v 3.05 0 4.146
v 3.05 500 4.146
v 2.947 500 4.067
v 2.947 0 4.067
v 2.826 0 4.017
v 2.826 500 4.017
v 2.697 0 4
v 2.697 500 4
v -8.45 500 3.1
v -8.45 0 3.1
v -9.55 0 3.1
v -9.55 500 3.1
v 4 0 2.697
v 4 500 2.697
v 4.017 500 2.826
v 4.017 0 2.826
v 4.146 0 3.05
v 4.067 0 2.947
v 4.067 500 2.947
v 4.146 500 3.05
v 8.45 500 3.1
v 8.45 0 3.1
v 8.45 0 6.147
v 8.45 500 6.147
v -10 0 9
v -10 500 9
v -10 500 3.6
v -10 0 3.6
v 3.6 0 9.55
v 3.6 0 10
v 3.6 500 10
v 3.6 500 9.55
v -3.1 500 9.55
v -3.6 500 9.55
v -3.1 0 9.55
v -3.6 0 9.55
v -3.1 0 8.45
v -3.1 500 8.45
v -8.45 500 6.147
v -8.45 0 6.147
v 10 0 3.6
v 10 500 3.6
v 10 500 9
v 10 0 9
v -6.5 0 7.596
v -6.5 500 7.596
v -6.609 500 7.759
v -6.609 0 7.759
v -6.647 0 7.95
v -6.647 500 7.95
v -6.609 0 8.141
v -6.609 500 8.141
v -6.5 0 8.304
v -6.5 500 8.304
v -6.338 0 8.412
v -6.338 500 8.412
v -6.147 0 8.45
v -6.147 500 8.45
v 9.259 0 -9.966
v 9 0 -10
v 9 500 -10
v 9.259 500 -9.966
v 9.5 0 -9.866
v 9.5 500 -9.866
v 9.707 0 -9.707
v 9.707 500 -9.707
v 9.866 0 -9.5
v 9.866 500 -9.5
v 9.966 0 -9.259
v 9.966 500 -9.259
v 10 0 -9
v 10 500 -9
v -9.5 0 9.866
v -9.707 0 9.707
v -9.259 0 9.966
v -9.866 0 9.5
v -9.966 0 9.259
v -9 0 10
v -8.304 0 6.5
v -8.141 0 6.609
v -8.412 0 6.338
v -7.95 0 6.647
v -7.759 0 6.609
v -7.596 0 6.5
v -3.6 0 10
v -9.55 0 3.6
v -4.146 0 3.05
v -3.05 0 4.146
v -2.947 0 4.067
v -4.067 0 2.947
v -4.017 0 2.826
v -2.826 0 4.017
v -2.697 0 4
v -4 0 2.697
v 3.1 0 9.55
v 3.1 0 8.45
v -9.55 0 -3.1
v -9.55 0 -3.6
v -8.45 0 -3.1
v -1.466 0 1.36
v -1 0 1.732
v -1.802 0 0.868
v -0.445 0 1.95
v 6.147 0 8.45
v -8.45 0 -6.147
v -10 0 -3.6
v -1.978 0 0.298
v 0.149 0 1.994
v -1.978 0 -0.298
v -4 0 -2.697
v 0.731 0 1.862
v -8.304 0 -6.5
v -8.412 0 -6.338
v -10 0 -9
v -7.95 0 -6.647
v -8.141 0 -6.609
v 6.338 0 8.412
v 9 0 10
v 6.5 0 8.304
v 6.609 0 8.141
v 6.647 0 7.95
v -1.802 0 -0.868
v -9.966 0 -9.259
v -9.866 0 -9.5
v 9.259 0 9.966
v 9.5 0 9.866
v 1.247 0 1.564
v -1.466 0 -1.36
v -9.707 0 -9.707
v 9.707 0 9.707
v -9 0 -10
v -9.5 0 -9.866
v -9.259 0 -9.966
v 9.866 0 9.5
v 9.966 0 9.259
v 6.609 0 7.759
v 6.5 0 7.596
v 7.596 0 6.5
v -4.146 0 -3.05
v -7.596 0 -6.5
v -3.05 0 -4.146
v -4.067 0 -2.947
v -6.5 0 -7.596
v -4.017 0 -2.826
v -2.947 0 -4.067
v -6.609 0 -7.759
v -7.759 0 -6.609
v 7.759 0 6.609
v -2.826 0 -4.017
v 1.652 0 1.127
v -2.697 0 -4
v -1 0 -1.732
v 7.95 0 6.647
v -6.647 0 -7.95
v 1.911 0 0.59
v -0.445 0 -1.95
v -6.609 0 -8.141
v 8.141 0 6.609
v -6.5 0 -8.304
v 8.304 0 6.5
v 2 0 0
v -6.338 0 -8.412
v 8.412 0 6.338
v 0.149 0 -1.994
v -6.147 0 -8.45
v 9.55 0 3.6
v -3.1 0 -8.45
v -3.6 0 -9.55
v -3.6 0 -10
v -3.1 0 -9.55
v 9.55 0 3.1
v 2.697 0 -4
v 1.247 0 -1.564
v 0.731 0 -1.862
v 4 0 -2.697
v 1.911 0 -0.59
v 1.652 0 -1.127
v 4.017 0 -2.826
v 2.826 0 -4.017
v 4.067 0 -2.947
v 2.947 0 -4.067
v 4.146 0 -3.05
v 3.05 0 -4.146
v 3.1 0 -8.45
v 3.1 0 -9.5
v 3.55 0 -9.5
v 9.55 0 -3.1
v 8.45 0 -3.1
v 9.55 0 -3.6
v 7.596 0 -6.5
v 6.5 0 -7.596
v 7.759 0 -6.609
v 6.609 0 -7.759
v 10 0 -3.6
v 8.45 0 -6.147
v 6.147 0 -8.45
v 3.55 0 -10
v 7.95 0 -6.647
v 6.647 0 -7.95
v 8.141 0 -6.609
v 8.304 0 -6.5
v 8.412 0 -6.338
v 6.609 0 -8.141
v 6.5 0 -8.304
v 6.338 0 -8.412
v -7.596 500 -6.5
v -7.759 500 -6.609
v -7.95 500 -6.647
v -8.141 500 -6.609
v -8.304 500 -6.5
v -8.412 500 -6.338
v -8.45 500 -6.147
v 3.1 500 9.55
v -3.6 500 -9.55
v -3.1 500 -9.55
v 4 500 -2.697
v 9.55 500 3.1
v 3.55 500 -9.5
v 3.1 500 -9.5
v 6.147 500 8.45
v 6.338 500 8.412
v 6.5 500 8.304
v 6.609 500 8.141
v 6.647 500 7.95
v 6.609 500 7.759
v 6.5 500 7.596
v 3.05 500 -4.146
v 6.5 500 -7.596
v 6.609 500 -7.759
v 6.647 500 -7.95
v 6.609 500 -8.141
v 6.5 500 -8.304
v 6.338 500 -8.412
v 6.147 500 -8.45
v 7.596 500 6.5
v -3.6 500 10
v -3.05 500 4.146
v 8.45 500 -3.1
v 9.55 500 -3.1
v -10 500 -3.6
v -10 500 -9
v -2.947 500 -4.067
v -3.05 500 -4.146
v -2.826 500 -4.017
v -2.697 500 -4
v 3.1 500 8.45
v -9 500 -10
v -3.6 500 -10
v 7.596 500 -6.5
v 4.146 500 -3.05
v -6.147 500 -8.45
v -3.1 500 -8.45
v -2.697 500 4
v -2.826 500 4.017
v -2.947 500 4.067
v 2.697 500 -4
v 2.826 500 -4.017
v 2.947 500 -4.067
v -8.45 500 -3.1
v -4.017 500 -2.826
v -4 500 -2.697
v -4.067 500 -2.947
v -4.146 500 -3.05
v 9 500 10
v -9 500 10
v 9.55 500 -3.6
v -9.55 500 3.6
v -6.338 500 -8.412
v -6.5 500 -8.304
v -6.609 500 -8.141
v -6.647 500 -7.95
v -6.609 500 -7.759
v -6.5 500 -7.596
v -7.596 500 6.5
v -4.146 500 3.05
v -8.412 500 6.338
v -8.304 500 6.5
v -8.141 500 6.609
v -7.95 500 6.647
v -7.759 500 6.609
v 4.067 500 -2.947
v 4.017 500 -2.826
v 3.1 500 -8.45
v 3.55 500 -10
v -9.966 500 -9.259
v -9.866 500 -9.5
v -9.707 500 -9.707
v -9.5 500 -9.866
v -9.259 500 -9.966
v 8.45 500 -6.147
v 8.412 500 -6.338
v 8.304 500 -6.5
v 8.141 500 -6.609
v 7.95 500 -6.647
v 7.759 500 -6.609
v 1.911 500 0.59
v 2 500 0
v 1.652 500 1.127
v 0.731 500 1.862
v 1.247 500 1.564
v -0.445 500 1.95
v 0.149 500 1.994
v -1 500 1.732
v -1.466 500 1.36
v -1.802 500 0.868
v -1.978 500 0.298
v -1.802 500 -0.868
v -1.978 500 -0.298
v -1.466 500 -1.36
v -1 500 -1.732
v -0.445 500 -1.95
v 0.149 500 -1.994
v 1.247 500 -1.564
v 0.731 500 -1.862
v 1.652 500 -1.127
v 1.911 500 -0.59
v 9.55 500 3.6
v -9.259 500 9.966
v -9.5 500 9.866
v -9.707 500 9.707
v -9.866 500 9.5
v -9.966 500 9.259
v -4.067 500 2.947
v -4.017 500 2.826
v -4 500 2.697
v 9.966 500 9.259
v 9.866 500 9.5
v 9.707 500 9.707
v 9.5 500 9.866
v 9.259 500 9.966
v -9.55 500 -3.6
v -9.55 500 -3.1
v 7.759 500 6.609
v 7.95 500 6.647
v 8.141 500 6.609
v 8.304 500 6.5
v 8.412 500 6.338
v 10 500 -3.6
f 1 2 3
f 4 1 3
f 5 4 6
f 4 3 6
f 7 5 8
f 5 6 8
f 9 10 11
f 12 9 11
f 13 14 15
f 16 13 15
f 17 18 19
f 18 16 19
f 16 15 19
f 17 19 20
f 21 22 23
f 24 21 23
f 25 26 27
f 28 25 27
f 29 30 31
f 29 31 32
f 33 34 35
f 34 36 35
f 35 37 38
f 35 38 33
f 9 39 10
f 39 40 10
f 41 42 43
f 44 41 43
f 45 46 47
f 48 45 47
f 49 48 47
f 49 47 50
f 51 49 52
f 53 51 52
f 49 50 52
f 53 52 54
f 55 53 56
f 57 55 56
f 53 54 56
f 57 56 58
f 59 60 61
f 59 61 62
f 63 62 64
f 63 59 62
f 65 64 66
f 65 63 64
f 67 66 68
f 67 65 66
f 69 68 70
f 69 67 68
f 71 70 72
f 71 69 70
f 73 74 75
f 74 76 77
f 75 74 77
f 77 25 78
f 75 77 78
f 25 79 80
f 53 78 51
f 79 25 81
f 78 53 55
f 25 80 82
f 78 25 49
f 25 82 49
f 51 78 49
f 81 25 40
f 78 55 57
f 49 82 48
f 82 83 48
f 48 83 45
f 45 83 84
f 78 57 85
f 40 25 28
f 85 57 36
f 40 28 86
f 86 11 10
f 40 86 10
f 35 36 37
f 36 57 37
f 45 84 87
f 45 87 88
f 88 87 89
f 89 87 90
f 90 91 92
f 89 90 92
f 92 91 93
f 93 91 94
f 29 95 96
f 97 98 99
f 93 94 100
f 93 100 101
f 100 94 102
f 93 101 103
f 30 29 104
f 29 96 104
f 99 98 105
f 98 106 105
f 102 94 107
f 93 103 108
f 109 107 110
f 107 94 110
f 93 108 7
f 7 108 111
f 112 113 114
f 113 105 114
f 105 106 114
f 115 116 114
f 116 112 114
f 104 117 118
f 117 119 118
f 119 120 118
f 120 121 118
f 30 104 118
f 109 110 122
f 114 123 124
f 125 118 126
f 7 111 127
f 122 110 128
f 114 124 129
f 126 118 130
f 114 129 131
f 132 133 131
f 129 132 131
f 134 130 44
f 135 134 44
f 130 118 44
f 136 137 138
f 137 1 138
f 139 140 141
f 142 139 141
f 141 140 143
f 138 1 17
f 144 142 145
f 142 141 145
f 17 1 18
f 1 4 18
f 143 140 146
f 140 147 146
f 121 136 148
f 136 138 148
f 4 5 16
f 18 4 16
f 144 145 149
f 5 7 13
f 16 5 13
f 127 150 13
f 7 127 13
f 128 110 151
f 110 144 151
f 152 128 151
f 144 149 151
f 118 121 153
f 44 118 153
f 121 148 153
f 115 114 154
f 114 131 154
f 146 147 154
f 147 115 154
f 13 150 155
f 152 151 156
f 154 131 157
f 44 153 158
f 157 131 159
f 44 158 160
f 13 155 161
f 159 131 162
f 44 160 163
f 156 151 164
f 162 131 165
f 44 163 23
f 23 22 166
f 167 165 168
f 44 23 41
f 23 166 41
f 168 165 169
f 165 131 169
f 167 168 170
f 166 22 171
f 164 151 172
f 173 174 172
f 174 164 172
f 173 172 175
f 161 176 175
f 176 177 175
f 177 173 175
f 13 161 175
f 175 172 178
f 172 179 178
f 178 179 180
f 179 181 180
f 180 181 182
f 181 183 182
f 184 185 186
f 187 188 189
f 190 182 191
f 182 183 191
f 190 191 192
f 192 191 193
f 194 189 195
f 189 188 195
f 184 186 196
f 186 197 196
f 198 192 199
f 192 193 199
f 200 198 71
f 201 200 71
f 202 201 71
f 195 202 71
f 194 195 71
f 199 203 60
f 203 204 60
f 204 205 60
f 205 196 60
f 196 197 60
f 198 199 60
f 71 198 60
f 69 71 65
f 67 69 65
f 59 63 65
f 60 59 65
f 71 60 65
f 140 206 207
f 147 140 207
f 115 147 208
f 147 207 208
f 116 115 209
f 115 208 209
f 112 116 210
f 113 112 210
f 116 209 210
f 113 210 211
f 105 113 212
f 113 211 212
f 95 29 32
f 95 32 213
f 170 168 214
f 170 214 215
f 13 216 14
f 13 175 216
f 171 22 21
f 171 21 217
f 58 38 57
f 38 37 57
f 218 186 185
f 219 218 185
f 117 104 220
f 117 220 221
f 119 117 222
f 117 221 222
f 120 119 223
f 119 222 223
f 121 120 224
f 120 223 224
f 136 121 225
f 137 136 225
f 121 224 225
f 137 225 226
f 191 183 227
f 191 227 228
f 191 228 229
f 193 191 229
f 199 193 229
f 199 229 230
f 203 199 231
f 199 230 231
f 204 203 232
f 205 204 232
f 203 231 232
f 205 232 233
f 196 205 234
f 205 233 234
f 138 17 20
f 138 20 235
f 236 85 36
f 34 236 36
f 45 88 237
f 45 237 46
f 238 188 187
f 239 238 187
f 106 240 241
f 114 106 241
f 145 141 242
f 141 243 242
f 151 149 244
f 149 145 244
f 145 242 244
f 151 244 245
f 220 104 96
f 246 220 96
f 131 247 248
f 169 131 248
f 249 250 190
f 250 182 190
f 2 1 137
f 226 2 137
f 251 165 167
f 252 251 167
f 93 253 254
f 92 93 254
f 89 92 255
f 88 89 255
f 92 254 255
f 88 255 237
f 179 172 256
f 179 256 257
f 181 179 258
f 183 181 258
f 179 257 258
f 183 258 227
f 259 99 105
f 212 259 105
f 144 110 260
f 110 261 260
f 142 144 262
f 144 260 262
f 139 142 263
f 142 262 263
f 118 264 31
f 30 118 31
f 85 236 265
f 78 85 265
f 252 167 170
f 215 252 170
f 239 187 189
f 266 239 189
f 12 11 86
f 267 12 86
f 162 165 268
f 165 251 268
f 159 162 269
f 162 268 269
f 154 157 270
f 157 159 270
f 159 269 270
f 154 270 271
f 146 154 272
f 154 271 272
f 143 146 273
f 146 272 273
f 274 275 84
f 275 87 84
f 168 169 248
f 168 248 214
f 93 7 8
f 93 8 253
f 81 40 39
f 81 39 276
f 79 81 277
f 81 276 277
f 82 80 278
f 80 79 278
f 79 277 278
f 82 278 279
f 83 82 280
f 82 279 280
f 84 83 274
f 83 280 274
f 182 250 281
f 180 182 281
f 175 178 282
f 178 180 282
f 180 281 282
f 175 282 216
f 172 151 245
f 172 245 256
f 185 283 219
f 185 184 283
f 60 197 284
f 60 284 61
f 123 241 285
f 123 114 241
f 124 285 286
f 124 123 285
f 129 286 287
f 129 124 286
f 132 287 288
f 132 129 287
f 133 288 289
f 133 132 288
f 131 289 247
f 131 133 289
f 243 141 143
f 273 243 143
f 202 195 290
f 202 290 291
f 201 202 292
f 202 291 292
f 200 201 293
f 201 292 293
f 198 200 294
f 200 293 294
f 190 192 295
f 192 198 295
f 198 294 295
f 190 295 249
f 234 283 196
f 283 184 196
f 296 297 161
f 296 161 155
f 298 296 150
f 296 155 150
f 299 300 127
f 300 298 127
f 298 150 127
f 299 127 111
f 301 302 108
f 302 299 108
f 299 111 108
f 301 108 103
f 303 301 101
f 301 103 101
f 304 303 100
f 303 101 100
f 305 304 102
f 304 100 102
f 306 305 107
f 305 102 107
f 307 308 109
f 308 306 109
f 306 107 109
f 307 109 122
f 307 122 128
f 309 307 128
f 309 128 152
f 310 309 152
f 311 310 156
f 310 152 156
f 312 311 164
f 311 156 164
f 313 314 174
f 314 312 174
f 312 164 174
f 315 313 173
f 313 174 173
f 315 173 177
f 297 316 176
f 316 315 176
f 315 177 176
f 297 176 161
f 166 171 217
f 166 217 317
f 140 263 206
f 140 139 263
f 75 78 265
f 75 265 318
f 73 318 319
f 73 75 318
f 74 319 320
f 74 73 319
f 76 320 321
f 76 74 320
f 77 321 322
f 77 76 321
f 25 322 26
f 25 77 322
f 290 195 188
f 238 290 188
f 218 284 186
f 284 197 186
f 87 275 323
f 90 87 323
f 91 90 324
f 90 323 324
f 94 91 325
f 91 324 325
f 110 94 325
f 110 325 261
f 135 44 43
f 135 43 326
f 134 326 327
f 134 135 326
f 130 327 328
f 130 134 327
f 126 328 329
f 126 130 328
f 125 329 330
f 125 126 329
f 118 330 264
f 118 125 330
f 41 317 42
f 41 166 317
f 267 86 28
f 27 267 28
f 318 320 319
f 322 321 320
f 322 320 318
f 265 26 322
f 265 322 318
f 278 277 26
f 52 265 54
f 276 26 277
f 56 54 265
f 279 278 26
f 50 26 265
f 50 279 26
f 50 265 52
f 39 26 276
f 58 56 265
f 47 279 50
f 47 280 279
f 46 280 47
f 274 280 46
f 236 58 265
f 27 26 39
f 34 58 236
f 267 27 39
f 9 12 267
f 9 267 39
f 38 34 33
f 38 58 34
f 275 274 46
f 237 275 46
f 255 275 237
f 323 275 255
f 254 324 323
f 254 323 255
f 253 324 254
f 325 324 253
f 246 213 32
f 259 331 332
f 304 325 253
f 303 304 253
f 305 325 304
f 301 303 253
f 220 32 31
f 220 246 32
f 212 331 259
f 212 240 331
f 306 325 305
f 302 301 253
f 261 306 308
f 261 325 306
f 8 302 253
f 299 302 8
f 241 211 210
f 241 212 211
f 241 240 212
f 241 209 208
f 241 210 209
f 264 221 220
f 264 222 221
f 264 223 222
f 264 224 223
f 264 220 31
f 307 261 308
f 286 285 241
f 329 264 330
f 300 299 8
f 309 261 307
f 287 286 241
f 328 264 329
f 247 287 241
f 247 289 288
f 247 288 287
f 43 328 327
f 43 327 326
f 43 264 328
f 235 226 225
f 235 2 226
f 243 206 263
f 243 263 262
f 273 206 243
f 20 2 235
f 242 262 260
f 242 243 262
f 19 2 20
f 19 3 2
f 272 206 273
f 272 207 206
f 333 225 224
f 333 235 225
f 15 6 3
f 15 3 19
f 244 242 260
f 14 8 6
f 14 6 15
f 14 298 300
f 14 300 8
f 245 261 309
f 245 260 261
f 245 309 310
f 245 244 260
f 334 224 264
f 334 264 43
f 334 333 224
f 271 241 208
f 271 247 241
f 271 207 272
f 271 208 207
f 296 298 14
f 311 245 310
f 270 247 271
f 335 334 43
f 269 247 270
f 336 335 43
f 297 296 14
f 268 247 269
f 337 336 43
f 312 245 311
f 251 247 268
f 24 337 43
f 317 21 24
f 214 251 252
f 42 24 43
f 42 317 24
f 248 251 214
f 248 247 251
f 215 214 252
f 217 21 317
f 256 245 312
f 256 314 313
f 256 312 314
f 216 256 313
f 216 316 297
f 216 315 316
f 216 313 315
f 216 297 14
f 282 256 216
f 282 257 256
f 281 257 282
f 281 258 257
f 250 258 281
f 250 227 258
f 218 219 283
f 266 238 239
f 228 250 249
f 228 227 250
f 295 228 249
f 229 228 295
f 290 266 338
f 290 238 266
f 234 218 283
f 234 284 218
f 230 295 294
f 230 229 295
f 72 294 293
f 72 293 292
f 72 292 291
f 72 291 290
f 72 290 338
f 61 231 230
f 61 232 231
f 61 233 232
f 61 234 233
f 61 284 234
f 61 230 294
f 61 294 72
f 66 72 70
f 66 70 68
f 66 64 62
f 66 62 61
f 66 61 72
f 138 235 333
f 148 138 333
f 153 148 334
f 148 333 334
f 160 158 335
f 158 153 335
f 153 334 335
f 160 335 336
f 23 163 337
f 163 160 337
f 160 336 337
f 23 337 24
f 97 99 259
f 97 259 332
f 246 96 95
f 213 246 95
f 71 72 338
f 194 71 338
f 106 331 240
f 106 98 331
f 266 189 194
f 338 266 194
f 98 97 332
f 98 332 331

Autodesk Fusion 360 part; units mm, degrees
sketch "Sketch1" plane through (0, 0, 0) normal (0, 1, 0) x (1, 0, 0)
  line L0 (9, -10) -> (-9, -10)
  line L1 (-10, -9) -> (-10, 9)
  line L2 (-9, 10) -> (9, 10)
  line L3 (10, 9) -> (10, -9)
  line L4 (10, -10) -> (-10, 10) construction
  line L5 (-10, -10) -> (10, 10) construction
  line L6 (4, -4) -> (-4, -4)
  line L7 (-4, -4) -> (-4, 4)
  line L8 (-4, 4) -> (4, 4)
  line L9 (4, 4) -> (4, -4)
  line L10 (4, -4) -> (-4, 4) construction
  line L11 (-4, -4) -> (4, 4) construction
  circle A0 centre (0, 0) radius 2
  line L12 (8.45, -8.45) -> (-8.45, -8.45)
  line L13 (-8.45, -8.45) -> (-8.45, 8.45)
  line L14 (-8.45, 8.45) -> (8.45, 8.45)
  line L15 (8.45, 8.45) -> (8.45, -8.45)
  line L16 (8.45, -8.45) -> (-8.45, 8.45) construction
  line L17 (-8.45, -8.45) -> (8.45, 8.45) construction
  line L18 (-9.452, -10.548) -> (10.548, 9.452) construction
  line L19 (-10.548, -9.452) -> (9.452, 10.548) construction
  line L20 (10.548, -9.452) -> (-9.452, 10.548) construction
  line L21 (9.452, -10.548) -> (-10.548, 9.452) construction
  line L22 (3.1, -10) -> (-3.1, -10) construction
  line L23 (-3.1, -10) -> (-3.1, 10) construction
  line L24 (-3.1, 10) -> (3.1, 10) construction
  line L25 (3.1, 10) -> (3.1, -10) construction
  line L26 (10, -3.1) -> (-10, -3.1) construction
  line L27 (-10, -3.1) -> (-10, 3.1) construction
  line L28 (-10, 3.1) -> (10, 3.1) construction
  line L29 (10, 3.1) -> (10, -3.1) construction
  line L30 (-3.1, -8.45) -> (-3.1, -10)
  line L31 (3.1, -8.45) -> (3.1, -10)
  line L32 (-8.45, -3.1) -> (-10, -3.1)
  line L33 (-8.45, 3.1) -> (-10, 3.1)
  line L34 (8.45, -3.1) -> (10, -3.1)
  line L35 (8.45, 3.1) -> (10, 3.1)
  line L36 (-3.1, 8.45) -> (-3.1, 10)
  line L37 (3.1, 8.45) -> (3.1, 10)
  line L38 (-4, 2.904) -> (-8.45, 7.354)
  line L39 (-2.904, 4) -> (-7.354, 8.45)
  line L40 (2.904, 4) -> (7.354, 8.45)
  line L41 (4, 2.904) -> (8.45, 7.354)
  line L42 (-4, -2.904) -> (-8.45, -7.354)
  line L43 (-2.904, -4) -> (-7.354, -8.45)
  line L44 (2.904, -4) -> (7.354, -8.45)
  line L45 (4, -2.904) -> (8.45, -7.354)
  line L46 (-10, -3.1) -> (-9.55, -3.1)
  line L47 (-9.55, -3.1) -> (-9.55, -3.6)
  line L48 (-9.55, -3.6) -> (-10, -3.6)
  line L49 (-10, -3.6) -> (-10, -3.1)
  line L50 (-10, 3.1) -> (-9.55, 3.1)
  line L51 (-9.55, 3.1) -> (-9.55, 3.6)
  line L52 (-9.55, 3.6) -> (-10, 3.6)
  line L53 (-10, 3.6) -> (-10, 3.1)
  line L54 (-3.1, -10) -> (-3.6, -10)
  line L55 (-3.6, -10) -> (-3.6, -9.55)
  line L56 (-3.6, -9.55) -> (-3.1, -9.55)
  line L57 (-3.1, -9.55) -> (-3.1, -10)
  line L58 (3.1, -10) -> (3.6, -10)
  line L59 (3.6, -10) -> (3.6, -9.55)
  line L60 (3.6, -9.55) -> (3.1, -9.55)
  line L61 (3.1, -9.55) -> (3.1, -10)
  line L62 (10, -3.1) -> (9.55, -3.1)
  line L63 (9.55, -3.1) -> (9.55, -3.6)
  line L64 (9.55, -3.6) -> (10, -3.6)
  line L65 (10, -3.6) -> (10, -3.1)
  line L66 (10, 3.1) -> (9.55, 3.1)
  line L67 (9.55, 3.1) -> (9.55, 3.6)
  line L68 (9.55, 3.6) -> (10, 3.6)
  line L69 (10, 3.6) -> (10, 3.1)
  line L70 (-3.1, 10) -> (-3.6, 10)
  line L71 (-3.6, 10) -> (-3.6, 9.55)
  line L72 (-3.6, 9.55) -> (-3.1, 9.55)
  line L73 (-3.1, 9.55) -> (-3.1, 10)
  line L74 (3.1, 10) -> (3.55, 10)
  line L75 (3.55, 10) -> (3.55, 9.5)
  line L76 (3.55, 9.5) -> (3.1, 9.5)
  line L77 (3.1, 9.5) -> (3.1, 10)
  arc A1 (-10, -9) -> (-9, -10) centre (-9, -9) ccw
  arc A2 (9, -10) -> (10, -9) centre (9, -9) ccw
  arc A3 (10, 9) -> (9, 10) centre (9, 9) ccw
  arc A4 (-9, 10) -> (-10, 9) centre (-9, 9) ccw
  dimension "d1" = 20
  dimension "d2" = 20
  dimension "d3" = 8
  dimension "d4" = 8
  dimension "d5" = 4
  dimension "d6" = 16.9
  dimension "d7" = 16.9
  dimension "d8" = 0.775
  dimension "d9" = -0.775
  dimension "d10" = 0.775
  dimension "d11" = -0.775
  dimension "d12" = 6.2
  dimension "d13" = 20
  dimension "d14" = 20
  dimension "d15" = 6.2
  dimension "d16" = 1.55
  dimension "d17" = 1.55
  dimension "d18" = 1.55
  dimension "d19" = 1.55
  dimension "d20" = 1.55
  dimension "d21" = 1.55
  dimension "d22" = 1.55
  dimension "d23" = 1.55
  dimension "d24" = 0.45
  dimension "d25" = 0.5
  dimension "d26" = 0.45
  dimension "d27" = 0.5
  dimension "d28" = 0.5
  dimension "d29" = 0.45
  dimension "d30" = 0.5
  dimension "d31" = 0.45
  dimension "d32" = 0.45
  dimension "d33" = 0.5
  dimension "d34" = 0.45
  dimension "d35" = 0.5
  dimension "d36" = 0.5
  dimension "d37" = 0.45
  dimension "d38" = 0.45
  dimension "d39" = 0.5
  dimension "d40" = 1
  dimension "d41" = 1
  dimension "d42" = 1
  dimension "d43" = 1
extrude "Extrude1" add sketch "Sketch1" along normal blind 500 contours L0 L3 L12 L15 L31 L34 L59 L60 L63 L64 A2 | L0 L1 L12 L13 L30 L32 L47 L48 L55 L56 A1 | L6 L9 L12 L15 L44 L45 | L2 L3 L14 L15 L35 L37 L67 L68 L75 L76 A3 | L6 L7 L12 L13 L42 L43 | L6 L7 L8 L9 | L8 L9 L14 L15 L40 L41 | L1 L2 L13 L14 L33 L36 L51 L52 L71 L72 A4 | L7 L8 L13 L14 L38 L39
fillet "Fillet1" radius 0.5 16 edges at (-8.45, 250, -7.354) (-7.354, 250, -8.45) (7.354, 250, -8.45) (8.45, 250, -7.354) (8.45, 250, 7.354) (7.354, 250, 8.45) (-7.354, 250, 8.45) (-8.45, 250, 7.354) (-2.904, 250, 4) (2.904, 250, 4) (-4, 250, 2.904) (-4, 250, -2.904) (-2.904, 250, -4) (2.904, 250, -4) (4, 250, -2.904) (4, 250, 2.904)
equation "d6 = 20 mm - ( ( 1.55 * 2 ) * 1 mm )"
equation "d7 = 20 mm - ( ( 1.55 * 2 ) * 1 mm )"
equation "d8 = ( 1.55 / 2 ) * 1 mm"
equation "d9 = ( -1.55 / 2 ) * 1 mm"
equation "d10 = ( 1.55 / 2 ) * 1 mm"
equation "d11 = ( -1.55 / 2 ) * 1 mm"
